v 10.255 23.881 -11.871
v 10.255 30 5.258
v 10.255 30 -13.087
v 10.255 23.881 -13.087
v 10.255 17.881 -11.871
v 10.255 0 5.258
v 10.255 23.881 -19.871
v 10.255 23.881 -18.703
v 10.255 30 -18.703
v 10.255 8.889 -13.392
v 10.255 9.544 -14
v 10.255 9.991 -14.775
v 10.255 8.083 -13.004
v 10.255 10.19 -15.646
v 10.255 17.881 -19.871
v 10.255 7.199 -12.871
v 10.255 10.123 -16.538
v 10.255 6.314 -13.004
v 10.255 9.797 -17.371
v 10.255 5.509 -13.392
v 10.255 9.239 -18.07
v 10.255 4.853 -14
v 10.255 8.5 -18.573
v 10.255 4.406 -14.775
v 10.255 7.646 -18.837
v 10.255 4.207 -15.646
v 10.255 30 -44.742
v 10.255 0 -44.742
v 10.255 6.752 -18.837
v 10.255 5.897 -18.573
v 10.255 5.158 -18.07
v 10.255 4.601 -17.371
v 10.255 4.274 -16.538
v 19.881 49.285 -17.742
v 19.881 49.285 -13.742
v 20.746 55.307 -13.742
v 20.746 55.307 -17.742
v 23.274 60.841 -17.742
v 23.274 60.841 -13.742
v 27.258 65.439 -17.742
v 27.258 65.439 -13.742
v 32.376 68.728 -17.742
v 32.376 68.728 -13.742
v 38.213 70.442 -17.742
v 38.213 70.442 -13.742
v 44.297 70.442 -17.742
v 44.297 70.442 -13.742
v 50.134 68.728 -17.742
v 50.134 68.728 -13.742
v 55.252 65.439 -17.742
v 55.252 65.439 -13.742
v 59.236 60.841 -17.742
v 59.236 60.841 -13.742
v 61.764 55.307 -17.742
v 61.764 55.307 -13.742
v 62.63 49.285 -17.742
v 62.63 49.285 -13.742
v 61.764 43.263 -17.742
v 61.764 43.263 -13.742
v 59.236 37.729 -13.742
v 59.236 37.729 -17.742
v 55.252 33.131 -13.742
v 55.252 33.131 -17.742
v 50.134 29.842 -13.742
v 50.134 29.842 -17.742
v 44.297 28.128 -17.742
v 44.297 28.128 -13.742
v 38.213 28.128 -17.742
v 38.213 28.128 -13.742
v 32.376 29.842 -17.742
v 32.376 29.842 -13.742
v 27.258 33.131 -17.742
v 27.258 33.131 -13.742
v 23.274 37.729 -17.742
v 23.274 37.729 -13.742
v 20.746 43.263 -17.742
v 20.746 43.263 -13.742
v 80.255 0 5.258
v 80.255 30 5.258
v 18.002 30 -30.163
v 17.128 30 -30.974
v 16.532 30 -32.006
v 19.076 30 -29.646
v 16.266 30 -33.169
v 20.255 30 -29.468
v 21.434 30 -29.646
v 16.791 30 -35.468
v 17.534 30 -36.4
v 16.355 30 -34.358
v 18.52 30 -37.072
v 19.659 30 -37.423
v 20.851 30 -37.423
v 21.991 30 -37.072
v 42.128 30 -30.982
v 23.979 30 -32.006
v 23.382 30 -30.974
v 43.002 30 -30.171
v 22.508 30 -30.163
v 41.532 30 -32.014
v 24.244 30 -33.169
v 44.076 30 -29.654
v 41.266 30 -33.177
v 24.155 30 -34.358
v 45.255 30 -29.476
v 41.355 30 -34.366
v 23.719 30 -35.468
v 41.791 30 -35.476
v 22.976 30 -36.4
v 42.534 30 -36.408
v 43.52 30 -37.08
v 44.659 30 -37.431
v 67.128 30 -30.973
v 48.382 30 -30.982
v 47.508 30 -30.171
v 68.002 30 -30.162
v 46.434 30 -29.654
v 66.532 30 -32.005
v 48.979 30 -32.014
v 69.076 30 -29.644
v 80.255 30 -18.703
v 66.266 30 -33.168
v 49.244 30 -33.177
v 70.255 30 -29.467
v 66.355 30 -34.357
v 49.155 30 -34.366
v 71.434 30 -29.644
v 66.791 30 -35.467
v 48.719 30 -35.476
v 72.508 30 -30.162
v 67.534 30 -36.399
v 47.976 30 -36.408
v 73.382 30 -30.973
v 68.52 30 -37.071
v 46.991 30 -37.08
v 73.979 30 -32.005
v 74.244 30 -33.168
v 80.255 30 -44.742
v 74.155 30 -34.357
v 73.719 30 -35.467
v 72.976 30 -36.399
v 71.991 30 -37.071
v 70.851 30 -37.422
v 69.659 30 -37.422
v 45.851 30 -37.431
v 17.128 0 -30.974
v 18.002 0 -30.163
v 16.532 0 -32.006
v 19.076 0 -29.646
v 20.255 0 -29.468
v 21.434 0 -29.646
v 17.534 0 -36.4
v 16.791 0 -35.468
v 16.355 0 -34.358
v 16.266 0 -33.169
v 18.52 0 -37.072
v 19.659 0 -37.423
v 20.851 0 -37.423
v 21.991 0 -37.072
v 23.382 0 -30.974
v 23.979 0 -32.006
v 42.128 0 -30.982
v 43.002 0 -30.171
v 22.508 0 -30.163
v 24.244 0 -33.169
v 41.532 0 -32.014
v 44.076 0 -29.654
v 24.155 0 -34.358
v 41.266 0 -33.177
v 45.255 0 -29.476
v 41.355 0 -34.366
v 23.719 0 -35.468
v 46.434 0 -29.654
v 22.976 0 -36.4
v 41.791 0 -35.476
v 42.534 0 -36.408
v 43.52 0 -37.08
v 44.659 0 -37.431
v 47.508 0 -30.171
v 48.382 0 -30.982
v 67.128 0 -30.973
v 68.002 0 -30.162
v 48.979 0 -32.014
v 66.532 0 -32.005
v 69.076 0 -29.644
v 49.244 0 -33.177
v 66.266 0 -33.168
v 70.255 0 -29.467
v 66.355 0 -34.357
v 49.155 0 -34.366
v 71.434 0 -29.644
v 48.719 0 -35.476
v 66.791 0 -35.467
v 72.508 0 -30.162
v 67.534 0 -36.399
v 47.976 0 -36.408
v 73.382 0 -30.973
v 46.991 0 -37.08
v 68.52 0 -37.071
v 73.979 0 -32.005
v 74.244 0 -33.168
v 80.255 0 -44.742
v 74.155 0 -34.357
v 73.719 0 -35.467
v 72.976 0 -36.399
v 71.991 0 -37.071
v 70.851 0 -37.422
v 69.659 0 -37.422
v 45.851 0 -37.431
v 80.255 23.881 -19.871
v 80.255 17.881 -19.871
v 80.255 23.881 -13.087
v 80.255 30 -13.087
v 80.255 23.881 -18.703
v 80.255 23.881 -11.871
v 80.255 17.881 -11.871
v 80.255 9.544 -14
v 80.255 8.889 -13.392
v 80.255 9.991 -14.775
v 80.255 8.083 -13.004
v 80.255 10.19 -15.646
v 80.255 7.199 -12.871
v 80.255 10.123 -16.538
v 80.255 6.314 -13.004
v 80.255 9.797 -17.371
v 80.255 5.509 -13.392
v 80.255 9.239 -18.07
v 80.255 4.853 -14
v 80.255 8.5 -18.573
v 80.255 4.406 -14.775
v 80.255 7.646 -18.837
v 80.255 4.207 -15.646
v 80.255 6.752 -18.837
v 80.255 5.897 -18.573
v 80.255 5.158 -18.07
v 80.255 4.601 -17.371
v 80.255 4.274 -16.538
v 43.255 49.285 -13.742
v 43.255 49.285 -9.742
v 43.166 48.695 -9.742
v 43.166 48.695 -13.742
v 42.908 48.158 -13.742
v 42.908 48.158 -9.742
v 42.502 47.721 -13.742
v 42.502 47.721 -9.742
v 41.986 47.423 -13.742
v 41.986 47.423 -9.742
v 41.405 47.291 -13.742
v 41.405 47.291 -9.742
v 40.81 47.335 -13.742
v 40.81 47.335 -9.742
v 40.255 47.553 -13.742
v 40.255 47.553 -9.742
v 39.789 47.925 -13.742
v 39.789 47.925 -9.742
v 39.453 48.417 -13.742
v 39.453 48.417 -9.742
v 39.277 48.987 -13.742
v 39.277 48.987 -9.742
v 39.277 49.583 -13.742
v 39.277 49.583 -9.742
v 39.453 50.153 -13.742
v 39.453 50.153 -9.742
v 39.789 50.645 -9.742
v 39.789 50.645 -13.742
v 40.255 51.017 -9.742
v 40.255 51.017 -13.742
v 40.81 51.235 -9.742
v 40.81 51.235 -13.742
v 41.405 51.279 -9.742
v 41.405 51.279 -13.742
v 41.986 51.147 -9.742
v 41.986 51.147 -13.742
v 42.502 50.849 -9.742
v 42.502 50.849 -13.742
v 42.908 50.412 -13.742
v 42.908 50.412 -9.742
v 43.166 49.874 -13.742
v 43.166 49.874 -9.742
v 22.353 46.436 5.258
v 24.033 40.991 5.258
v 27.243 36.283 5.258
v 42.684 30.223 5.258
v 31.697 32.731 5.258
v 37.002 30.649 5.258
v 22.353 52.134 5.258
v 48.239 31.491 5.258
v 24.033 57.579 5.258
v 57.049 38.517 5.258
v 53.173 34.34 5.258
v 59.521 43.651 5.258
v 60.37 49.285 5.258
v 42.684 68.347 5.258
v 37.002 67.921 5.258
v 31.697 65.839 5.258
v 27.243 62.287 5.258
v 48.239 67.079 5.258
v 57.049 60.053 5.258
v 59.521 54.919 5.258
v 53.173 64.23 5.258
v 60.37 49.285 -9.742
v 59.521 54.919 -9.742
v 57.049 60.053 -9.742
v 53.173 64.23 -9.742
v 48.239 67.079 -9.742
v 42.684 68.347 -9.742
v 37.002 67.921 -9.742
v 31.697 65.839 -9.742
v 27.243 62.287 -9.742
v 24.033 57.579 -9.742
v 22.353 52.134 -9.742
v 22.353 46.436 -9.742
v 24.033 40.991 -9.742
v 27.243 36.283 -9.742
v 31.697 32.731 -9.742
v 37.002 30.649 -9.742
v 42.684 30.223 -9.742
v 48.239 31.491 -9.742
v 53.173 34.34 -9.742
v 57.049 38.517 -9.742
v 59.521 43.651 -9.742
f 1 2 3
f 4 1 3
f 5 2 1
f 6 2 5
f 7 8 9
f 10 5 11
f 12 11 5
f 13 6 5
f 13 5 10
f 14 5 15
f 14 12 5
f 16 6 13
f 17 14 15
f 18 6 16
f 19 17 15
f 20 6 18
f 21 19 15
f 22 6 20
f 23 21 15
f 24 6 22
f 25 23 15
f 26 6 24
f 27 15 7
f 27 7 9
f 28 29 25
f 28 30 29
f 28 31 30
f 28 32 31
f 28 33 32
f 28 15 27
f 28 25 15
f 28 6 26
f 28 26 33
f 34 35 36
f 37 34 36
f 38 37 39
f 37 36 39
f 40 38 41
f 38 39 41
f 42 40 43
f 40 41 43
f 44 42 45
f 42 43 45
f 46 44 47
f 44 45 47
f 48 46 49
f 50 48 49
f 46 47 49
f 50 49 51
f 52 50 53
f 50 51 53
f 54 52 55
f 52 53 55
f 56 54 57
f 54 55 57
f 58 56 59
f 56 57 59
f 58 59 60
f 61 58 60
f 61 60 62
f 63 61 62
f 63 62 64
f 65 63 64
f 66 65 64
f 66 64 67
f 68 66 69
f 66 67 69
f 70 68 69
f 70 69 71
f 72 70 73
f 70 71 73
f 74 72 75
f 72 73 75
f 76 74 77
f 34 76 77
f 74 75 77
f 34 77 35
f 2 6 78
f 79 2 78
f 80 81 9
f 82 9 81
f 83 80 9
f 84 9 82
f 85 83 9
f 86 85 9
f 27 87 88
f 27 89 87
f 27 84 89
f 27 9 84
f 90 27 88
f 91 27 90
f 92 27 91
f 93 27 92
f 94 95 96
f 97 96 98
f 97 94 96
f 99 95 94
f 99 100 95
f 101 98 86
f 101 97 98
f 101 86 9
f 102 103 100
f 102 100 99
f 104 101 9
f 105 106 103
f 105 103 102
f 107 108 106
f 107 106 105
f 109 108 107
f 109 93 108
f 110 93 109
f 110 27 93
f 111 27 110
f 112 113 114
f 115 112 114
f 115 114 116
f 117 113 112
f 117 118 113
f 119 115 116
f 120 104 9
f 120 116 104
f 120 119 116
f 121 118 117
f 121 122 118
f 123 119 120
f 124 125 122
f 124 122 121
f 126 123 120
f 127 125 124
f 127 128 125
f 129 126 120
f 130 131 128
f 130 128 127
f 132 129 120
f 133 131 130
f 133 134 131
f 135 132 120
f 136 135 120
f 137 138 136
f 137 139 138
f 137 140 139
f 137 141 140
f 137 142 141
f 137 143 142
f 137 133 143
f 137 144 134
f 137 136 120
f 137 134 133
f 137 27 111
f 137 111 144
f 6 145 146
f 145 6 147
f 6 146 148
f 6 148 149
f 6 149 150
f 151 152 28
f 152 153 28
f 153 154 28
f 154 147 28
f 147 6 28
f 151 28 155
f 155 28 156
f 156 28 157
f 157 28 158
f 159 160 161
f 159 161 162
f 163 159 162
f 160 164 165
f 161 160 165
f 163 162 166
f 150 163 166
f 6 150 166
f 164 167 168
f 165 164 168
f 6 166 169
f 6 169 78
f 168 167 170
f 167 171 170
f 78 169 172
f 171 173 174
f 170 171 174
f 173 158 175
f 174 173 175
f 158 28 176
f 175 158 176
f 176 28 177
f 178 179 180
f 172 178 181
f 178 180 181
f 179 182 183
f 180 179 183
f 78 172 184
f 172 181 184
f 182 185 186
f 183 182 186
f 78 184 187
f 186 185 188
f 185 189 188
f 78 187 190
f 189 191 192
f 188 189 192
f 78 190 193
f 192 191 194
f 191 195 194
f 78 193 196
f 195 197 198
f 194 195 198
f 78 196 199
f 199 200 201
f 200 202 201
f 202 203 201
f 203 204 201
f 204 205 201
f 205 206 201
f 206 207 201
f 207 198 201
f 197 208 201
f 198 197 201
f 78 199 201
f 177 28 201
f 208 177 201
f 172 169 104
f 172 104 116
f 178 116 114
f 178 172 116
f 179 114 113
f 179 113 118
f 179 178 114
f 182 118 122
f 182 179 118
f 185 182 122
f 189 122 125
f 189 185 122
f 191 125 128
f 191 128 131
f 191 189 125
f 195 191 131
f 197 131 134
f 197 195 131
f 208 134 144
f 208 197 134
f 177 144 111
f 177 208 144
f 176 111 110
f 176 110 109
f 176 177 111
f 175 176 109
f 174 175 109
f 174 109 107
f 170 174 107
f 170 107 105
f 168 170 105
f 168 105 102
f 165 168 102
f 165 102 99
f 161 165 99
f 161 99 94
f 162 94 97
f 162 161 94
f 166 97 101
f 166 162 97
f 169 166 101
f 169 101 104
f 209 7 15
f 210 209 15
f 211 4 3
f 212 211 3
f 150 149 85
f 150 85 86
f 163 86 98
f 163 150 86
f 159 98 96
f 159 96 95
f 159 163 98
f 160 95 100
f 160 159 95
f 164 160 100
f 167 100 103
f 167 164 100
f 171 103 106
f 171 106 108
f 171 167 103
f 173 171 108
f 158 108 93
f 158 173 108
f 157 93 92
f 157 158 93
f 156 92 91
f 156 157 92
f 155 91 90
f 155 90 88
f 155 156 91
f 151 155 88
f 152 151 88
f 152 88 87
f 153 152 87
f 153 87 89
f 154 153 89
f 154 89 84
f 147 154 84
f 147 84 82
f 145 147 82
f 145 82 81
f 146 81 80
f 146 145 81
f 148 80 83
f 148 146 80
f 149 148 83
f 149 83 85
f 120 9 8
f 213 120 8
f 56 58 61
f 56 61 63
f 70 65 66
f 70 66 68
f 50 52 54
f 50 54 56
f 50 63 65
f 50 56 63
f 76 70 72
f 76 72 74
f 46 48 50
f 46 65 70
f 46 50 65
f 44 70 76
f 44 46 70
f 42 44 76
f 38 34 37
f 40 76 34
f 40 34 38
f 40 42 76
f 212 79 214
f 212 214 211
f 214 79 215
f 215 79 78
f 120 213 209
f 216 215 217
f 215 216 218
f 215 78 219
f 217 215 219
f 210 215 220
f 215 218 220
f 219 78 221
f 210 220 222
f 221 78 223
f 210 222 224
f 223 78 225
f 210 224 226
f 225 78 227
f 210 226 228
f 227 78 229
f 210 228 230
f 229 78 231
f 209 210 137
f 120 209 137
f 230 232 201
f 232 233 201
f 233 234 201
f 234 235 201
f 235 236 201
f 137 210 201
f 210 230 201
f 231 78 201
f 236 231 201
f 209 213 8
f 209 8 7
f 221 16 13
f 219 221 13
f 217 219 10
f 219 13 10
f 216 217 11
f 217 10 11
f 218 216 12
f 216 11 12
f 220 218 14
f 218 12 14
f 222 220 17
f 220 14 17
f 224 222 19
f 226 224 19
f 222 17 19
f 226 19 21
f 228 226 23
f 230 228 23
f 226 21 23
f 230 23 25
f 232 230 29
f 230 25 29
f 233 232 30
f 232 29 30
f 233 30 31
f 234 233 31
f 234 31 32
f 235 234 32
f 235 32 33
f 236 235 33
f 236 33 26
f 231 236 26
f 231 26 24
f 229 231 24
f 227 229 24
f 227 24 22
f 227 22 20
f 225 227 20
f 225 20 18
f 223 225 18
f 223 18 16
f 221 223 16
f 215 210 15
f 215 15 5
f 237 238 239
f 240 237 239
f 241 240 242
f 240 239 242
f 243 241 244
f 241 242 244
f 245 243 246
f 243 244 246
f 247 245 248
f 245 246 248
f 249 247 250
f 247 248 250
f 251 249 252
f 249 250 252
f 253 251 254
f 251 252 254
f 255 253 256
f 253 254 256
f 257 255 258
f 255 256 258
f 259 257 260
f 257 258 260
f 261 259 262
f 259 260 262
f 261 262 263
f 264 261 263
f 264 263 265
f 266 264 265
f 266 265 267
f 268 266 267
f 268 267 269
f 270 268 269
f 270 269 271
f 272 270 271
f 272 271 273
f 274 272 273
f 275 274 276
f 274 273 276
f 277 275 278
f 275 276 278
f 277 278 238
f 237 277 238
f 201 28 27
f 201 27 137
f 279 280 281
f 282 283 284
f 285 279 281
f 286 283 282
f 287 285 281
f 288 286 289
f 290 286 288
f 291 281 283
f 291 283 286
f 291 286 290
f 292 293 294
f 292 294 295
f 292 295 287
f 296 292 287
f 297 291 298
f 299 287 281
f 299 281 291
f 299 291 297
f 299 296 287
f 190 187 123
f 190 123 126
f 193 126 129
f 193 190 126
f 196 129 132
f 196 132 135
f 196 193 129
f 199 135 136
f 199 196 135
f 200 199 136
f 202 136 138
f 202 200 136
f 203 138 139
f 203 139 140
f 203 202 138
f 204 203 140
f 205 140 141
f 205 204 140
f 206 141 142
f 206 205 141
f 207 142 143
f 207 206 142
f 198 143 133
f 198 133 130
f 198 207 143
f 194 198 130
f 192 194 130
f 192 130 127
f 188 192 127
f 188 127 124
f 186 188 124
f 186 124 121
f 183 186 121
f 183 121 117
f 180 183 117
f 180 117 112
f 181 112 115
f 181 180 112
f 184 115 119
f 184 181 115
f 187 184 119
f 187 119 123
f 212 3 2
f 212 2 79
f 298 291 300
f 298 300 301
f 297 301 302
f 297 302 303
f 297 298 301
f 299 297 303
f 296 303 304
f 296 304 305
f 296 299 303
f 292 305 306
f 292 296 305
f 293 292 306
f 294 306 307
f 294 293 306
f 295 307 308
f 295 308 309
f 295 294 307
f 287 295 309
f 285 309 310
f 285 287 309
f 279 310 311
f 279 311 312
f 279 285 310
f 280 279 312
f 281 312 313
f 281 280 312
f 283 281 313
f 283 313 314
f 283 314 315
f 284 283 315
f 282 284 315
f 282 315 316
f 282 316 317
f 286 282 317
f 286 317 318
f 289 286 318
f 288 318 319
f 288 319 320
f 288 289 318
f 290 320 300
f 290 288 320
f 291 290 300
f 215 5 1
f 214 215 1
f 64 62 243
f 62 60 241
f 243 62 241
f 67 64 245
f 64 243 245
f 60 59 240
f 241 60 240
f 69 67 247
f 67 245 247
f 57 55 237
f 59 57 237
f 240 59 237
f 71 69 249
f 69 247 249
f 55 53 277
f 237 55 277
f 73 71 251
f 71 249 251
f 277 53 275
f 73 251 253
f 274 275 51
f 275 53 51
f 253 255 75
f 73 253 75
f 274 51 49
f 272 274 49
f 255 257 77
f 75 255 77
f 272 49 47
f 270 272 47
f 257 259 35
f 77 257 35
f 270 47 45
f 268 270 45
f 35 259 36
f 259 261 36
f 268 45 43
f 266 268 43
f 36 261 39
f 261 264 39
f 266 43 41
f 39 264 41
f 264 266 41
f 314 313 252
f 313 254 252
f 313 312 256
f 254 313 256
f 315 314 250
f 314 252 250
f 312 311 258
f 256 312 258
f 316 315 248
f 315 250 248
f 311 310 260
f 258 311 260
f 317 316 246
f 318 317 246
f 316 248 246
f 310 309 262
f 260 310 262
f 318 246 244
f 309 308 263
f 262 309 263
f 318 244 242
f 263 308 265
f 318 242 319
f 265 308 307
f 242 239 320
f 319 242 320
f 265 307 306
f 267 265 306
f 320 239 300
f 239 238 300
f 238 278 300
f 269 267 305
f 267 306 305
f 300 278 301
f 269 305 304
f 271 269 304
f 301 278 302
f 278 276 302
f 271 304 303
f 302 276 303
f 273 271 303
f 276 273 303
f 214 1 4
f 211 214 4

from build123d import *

# Parameters (mm, degrees)
SKETCH1_W           = 70
SKETCH1_H           = 50
SKETCH1_R           = 4
BOSS_EXTRUDE1_DEPTH = 30
SKETCH2_R           = 3
CUT_EXTRUDE1_DEPTH  = 71
SKETCH6_R           = 19.115114925
BOSS_EXTRUDE3_DEPTH = 15
SKETCH7_R           = 2
BOSS_EXTRUDE4_DEPTH = 4
SKETCH8_R           = 21.374545816
BOSS_EXTRUDE5_DEPTH = 4


with BuildPart() as part:
    # Sketch1 → Boss-Extrude1 (new body)
    with BuildSketch(Plane(origin=(0, 0, 0), x_dir=(1, 0, 0), z_dir=(0, 1, 0))):
        with Locations((45.25504703, 19.741860607)):
            Rectangle(SKETCH1_W, SKETCH1_H)
        with Locations(Location((45.25504703, 33.47585277, 0), (0, 0, 270))):
            Circle(SKETCH1_R, mode=Mode.SUBTRACT)
        with Locations(Location((70.25504538, 33.466769909, 0), (0, 0, 270))):
            Circle(SKETCH1_R, mode=Mode.SUBTRACT)
        with Locations(Location((20.255048319, 33.467826551, 0), (0, 0, 270))):
            Circle(SKETCH1_R, mode=Mode.SUBTRACT)
    extrude(amount=BOSS_EXTRUDE1_DEPTH)

    # Sketch2 → Cut-Extrude1 (cut)
    with BuildSketch(Plane.ZY.offset(-10.25504703)):
        with Locations((-15.87058853, 7.198699216)):
            Circle(SKETCH2_R)
        Polygon((-19.87058853, 17.881027255), (-11.87058853, 17.881027255), (-11.87058853, 23.881027255), (-13.086657096, 23.881027255), (-13.086657096, 30), (-18.703311227, 30), (-18.703311227, 23.881027255), (-19.87058853, 23.881027255), align=None)
    extrude(amount=-CUT_EXTRUDE1_DEPTH, mode=Mode.SUBTRACT)


with BuildPart() as body_2:
    # Sketch6 → Boss-Extrude3 (new body)
    with BuildSketch(Plane.XY.offset(5.258139393)):
        with Locations((41.25504703, 49.284939292)):
            Circle(SKETCH6_R)
    extrude(amount=-BOSS_EXTRUDE3_DEPTH)

    # Sketch7 → Boss-Extrude4 (add)
    with BuildSketch(Plane(origin=(0, 0, -9.741860607), x_dir=(-1, 0, 0), z_dir=(0, 0, -1))):
        with Locations(Location((-41.25504703, 49.284939292, 0), (0, 0, 180))):
            Circle(SKETCH7_R)
    extrude(amount=BOSS_EXTRUDE4_DEPTH)

    # Sketch8 → Boss-Extrude5 (add)
    with BuildSketch(Plane(origin=(0, 0, -13.741860607), x_dir=(-1, 0, 0), z_dir=(0, 0, -1))):
        with Locations((-41.25504703, 49.284939292)):
            Circle(SKETCH8_R)
    extrude(amount=BOSS_EXTRUDE5_DEPTH)


solid = Compound([part.part, body_2.part])
